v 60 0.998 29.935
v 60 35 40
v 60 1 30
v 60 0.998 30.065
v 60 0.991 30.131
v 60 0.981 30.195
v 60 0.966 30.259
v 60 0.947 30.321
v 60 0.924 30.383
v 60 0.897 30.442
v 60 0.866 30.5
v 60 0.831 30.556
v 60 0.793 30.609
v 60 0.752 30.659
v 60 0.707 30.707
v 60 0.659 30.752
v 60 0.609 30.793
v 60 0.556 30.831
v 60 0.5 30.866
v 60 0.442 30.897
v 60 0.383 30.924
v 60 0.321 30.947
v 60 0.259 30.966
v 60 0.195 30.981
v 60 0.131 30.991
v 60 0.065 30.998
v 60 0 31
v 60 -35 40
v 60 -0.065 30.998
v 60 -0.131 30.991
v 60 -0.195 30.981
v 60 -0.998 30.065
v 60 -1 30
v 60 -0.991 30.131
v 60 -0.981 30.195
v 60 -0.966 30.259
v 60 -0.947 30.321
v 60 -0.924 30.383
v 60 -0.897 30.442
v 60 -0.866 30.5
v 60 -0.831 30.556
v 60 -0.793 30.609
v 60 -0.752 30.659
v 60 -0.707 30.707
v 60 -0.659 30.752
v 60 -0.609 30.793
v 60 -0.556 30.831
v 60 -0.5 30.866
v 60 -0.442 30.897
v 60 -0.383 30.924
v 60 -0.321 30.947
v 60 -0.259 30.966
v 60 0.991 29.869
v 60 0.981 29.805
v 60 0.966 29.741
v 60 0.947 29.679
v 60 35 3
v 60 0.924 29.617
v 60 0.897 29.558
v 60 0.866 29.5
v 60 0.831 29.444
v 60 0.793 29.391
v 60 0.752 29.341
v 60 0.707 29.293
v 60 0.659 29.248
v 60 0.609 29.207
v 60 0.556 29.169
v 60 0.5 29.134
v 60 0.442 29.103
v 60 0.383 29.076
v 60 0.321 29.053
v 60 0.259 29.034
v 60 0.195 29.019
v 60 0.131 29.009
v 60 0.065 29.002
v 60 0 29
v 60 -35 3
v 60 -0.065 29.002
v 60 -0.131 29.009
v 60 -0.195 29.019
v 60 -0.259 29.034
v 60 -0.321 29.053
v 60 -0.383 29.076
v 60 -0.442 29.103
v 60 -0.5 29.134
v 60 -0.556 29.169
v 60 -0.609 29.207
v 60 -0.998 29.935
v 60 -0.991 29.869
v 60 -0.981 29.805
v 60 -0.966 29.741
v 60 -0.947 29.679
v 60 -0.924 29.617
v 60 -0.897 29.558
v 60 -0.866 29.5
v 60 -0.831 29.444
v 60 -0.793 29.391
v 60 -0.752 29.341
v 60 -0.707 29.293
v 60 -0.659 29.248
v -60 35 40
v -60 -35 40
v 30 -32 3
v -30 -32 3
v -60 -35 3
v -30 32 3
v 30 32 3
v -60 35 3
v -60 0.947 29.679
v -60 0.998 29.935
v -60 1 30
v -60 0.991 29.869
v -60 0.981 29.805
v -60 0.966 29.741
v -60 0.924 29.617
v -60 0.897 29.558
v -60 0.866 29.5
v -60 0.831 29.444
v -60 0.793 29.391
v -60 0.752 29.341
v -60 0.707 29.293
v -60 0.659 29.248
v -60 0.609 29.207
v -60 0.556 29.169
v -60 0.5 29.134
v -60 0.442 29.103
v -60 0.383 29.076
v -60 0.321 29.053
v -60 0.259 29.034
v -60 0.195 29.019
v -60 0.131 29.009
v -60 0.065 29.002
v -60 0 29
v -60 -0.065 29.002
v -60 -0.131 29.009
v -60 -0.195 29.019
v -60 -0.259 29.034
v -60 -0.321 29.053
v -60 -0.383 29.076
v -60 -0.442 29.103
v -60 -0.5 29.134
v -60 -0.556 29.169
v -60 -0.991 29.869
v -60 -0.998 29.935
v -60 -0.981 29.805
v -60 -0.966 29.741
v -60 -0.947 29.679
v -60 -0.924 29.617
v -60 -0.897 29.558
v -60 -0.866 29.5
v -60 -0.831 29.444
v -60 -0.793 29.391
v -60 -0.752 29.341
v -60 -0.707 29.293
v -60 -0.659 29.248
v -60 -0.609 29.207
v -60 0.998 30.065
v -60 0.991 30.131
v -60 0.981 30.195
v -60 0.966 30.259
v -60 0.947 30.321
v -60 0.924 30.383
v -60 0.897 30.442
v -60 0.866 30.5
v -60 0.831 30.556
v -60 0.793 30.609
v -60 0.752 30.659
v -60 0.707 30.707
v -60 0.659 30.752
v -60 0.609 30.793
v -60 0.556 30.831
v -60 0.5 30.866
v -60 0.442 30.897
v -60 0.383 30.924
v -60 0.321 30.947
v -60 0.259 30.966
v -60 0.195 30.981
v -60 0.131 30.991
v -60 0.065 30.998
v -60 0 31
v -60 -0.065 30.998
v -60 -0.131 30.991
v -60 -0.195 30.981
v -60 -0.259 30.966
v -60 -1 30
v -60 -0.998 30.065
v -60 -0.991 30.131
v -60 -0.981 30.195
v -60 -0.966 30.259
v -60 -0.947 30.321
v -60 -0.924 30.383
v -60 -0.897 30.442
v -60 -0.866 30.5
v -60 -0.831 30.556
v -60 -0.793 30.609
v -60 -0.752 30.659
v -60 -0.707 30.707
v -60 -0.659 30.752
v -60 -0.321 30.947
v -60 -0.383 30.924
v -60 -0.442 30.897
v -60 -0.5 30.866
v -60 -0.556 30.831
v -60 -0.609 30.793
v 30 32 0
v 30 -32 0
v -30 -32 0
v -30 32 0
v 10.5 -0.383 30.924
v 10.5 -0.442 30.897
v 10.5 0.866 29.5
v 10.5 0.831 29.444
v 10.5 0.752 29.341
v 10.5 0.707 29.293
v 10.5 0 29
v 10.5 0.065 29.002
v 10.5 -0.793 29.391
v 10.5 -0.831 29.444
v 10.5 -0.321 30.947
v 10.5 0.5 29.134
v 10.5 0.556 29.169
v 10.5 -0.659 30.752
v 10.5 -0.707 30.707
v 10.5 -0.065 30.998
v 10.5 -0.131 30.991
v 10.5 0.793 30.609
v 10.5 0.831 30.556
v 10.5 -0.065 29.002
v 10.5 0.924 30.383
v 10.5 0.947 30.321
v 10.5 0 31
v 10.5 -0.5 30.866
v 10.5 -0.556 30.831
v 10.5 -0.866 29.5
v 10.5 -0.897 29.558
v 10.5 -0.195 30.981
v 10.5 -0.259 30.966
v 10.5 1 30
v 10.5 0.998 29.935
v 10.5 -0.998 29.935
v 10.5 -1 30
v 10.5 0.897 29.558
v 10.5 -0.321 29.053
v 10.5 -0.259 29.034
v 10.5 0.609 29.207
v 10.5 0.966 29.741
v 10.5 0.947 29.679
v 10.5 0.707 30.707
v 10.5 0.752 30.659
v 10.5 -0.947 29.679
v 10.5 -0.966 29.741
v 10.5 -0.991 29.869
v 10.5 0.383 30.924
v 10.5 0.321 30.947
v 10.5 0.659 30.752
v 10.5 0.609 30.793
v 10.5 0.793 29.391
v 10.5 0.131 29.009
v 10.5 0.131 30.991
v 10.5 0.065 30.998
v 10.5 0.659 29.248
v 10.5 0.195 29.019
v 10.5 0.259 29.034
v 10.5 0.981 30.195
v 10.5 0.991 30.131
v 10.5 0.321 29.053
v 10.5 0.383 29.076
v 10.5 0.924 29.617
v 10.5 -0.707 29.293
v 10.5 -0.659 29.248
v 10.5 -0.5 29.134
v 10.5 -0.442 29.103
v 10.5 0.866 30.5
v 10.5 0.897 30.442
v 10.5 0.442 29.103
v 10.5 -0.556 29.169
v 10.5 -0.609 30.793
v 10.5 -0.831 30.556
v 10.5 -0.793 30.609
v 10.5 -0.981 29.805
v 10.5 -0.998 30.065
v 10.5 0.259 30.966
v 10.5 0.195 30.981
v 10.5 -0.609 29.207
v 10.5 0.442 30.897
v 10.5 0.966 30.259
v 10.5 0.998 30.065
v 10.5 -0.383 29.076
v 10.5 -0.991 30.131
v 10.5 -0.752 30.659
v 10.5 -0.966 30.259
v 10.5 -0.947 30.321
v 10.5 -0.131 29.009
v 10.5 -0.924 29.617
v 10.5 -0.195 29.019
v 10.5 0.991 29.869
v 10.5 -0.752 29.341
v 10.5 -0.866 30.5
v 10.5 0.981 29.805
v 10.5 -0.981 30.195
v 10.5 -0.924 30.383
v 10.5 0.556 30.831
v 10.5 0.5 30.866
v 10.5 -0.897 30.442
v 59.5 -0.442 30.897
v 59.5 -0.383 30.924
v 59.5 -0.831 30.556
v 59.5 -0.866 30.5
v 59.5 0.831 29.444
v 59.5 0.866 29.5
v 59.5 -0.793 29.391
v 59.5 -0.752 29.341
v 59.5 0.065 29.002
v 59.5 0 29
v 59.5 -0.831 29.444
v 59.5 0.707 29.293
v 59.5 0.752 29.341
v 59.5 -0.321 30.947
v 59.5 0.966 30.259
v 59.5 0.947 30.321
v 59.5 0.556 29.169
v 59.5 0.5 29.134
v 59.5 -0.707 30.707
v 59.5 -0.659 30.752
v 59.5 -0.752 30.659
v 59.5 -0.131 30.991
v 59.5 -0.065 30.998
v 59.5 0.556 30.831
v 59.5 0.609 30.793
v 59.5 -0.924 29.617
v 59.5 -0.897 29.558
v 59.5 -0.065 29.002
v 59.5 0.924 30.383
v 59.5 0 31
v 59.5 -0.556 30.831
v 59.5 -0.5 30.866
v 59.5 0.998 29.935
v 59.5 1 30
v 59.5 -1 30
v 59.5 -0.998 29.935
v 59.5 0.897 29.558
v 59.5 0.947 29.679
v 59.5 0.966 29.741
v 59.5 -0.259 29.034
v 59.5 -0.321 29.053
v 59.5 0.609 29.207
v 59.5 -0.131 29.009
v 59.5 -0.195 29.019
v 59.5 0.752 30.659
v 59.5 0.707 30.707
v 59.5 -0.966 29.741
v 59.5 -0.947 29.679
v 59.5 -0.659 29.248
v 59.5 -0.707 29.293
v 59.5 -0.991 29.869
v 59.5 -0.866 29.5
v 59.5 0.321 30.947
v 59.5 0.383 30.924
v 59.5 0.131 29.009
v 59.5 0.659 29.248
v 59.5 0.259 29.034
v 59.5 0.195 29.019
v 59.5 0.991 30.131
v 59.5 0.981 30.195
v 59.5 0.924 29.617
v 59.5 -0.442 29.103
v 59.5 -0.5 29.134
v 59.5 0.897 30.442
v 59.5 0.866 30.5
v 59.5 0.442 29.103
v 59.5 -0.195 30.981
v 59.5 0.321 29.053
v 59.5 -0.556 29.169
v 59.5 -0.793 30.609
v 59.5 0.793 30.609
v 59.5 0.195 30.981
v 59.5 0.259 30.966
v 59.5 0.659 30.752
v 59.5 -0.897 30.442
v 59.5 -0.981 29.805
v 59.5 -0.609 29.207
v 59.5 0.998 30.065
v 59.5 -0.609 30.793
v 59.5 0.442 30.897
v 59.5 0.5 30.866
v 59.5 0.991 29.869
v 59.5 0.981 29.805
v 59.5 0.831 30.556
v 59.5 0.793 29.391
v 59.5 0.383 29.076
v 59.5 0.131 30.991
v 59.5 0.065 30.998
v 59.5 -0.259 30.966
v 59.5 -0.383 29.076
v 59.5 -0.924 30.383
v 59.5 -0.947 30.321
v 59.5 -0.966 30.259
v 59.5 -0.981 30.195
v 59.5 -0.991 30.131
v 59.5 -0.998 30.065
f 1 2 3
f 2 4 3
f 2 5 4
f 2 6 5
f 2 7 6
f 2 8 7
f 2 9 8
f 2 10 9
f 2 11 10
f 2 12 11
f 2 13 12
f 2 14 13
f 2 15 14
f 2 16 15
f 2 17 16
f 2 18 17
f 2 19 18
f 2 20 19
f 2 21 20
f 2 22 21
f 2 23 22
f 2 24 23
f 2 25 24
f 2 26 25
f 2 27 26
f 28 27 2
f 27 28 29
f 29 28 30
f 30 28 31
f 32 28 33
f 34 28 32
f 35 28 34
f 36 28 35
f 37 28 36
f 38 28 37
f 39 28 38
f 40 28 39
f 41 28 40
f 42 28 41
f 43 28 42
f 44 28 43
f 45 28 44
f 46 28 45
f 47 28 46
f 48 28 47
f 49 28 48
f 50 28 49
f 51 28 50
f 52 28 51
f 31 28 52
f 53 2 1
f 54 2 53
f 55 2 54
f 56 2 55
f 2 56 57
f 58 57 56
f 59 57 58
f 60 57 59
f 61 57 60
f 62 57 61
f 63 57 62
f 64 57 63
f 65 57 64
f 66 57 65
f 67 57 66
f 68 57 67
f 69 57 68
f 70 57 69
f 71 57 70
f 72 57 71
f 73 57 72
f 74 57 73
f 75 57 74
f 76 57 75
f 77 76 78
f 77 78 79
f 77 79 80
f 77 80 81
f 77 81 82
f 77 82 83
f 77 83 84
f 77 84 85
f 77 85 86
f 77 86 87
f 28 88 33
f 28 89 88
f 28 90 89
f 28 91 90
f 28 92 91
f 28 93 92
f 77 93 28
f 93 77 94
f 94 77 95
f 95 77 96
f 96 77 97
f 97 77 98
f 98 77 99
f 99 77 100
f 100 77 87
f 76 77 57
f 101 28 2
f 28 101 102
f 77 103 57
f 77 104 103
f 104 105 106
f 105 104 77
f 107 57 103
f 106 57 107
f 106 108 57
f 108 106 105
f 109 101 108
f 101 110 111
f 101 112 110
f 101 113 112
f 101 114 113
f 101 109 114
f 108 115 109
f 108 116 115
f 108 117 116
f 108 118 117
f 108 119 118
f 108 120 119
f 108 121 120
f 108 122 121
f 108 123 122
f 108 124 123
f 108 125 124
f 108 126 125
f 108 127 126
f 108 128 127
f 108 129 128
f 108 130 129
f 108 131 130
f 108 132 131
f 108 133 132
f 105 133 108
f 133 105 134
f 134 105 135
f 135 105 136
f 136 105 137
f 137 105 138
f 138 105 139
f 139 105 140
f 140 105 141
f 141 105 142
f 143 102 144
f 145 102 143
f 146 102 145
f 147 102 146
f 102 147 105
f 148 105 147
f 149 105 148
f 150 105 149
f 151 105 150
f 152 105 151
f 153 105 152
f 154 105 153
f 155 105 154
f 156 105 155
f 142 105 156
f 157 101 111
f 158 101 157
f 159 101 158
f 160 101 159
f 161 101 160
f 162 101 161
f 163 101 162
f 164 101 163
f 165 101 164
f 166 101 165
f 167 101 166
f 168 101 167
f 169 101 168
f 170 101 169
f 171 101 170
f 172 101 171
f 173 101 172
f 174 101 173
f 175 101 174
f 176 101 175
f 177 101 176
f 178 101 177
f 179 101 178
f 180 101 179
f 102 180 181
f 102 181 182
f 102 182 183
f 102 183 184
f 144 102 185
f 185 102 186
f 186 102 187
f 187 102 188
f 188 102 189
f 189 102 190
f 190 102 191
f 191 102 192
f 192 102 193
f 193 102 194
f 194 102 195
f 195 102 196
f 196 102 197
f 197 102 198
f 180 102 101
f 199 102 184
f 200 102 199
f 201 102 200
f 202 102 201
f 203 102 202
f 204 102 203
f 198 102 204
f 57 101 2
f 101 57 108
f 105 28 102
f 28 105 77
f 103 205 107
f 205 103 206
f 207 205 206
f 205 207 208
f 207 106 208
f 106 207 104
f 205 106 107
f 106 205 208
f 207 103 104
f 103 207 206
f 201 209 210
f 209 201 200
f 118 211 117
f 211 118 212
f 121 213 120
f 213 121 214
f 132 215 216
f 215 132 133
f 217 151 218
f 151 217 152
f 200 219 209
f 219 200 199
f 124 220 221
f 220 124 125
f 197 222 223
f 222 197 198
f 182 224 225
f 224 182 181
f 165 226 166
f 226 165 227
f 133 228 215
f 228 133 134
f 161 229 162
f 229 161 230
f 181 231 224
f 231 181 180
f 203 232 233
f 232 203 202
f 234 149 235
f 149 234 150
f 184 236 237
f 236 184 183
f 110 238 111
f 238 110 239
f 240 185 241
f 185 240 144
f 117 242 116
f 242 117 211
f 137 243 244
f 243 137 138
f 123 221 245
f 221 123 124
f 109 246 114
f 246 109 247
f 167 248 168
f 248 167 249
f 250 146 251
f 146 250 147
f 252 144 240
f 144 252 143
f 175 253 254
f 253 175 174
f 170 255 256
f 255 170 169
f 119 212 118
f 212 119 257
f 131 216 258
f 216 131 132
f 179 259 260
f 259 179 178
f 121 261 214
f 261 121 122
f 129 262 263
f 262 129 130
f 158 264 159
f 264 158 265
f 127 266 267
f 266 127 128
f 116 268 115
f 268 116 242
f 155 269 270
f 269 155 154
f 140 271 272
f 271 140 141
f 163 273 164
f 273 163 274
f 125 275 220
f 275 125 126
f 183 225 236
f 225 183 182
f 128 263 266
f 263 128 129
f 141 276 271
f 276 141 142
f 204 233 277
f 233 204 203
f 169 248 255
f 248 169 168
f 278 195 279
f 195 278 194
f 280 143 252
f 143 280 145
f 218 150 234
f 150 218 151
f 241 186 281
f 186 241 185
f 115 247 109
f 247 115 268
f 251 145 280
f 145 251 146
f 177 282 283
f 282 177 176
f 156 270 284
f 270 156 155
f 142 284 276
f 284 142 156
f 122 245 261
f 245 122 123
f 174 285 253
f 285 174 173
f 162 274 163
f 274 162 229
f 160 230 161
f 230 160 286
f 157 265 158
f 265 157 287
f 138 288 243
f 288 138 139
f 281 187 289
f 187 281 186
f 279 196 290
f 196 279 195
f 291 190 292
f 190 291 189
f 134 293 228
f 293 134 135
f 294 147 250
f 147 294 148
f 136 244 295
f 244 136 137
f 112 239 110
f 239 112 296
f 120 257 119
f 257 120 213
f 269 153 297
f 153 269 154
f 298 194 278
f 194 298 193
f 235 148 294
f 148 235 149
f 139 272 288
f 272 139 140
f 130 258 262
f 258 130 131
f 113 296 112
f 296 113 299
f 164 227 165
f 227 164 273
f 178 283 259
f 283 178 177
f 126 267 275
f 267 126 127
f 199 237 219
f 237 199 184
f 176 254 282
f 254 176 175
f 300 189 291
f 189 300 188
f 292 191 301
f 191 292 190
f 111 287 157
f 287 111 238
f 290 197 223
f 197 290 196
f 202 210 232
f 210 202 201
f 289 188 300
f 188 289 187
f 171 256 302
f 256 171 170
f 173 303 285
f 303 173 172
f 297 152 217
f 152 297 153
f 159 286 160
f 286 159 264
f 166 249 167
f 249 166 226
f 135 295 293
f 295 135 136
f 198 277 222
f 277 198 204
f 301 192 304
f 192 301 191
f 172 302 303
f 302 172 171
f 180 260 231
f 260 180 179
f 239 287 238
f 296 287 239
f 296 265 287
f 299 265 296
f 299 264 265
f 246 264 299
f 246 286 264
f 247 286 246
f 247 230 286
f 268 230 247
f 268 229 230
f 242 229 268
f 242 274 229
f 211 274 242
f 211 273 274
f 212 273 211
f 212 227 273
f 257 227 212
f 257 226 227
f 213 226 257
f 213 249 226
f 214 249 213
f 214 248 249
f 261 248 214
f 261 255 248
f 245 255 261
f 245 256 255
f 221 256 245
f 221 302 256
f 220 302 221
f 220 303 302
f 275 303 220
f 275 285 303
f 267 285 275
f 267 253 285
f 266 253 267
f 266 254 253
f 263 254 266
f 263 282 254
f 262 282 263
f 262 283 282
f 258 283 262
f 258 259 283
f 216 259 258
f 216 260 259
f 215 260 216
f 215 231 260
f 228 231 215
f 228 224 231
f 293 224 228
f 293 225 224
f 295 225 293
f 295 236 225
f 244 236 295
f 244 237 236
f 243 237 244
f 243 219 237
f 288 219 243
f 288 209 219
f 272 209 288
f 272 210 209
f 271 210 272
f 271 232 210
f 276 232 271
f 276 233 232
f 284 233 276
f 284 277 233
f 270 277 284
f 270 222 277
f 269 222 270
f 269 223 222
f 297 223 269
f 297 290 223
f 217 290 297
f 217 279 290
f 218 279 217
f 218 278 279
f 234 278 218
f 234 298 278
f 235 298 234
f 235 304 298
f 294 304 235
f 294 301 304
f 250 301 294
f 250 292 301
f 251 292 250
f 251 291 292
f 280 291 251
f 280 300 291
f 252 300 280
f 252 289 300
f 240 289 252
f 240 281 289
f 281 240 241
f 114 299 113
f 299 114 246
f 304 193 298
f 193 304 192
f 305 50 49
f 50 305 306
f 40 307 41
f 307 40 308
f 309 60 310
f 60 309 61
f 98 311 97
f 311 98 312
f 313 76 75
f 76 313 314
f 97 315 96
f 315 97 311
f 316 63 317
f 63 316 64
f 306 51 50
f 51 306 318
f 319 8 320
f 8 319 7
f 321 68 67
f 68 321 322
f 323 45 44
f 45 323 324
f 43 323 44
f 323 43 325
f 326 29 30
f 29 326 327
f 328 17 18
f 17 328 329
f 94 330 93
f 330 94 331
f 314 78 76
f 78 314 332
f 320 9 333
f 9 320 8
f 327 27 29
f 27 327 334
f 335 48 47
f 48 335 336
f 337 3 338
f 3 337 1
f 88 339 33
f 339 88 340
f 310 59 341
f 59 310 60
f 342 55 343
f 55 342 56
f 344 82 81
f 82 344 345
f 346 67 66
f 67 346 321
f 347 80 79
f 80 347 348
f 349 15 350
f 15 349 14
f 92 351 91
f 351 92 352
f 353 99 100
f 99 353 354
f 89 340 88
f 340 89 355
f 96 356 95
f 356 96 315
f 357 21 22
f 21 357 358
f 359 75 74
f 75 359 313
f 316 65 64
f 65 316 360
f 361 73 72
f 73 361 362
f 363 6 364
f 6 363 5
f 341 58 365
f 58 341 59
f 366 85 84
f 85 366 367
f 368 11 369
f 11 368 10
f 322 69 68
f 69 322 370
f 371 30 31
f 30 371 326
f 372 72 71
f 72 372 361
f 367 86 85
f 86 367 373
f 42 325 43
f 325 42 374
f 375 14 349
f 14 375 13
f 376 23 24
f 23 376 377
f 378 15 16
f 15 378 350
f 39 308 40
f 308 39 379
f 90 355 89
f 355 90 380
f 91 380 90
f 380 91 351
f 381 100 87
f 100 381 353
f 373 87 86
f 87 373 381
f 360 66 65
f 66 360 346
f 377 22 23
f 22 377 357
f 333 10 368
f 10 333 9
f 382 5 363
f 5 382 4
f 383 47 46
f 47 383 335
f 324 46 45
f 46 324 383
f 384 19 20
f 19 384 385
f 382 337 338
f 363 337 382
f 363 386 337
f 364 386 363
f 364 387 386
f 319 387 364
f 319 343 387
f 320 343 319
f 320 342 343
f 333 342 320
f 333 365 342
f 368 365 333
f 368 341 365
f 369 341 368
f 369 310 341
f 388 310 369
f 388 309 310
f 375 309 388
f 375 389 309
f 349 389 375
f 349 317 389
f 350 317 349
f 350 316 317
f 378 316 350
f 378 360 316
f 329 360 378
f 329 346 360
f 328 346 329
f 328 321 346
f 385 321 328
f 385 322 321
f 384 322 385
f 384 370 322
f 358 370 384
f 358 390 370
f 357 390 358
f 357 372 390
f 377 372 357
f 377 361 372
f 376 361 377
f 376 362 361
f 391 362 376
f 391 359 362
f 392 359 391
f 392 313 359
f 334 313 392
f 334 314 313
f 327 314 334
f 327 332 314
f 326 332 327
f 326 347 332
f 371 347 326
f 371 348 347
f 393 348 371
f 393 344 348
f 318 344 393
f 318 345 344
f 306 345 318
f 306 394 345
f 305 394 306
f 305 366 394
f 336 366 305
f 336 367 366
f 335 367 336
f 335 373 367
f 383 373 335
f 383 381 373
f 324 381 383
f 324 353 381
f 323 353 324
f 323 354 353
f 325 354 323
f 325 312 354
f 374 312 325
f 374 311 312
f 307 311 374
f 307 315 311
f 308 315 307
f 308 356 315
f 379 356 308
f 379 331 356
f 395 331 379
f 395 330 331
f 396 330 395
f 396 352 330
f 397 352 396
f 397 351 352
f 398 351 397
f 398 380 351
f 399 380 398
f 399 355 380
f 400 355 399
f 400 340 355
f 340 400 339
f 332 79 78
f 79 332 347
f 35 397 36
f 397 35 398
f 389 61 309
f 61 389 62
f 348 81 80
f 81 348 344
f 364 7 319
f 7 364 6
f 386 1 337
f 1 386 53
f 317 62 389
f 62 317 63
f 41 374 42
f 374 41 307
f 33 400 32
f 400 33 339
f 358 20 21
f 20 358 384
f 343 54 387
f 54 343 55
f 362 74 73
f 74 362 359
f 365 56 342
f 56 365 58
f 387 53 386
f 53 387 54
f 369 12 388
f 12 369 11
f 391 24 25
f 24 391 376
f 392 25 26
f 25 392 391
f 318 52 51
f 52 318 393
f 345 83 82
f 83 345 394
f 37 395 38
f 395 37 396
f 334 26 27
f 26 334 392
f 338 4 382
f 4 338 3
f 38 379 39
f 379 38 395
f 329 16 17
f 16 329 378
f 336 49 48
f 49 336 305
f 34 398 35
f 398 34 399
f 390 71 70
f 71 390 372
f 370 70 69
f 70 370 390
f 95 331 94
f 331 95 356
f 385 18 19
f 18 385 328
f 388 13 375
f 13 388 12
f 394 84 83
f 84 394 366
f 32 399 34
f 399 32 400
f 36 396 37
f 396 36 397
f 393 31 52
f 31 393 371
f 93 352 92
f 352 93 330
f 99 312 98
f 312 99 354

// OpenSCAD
// Mini horizontal gel-electrophoresis buffer tank
// Print orientation: base on XY plane, open top facing +Z

// ---------- Parameters ----------
outer_x   = 120;   // outer length in X (mm)
outer_y   = 70;    // outer width in Y (mm)
height    = 40;    // overall height in Z (mm)
wall      = 3;     // wall thickness (mm)
floor     = 3;     // floor thickness (mm)

platform_x = 60;   // platform length in X (mm), centred
platform_top_z = 13; // top of platform above inner floor (mm)

hole_d     = 2;    // electrode hole diameter (mm)
hole_y     = 0;    // hole Y position (mm)
hole_z     = 30;   // hole Z position (mm)

eps        = 0.5;  // cutter overshoot past faces (mm)

$fn = 96;

// ---------- Derived ----------
inner_x = outer_x - 2*wall;   // 114
inner_y = outer_y - 2*wall;   // 64
floor_t = floor;              // 3
plat_h  = platform_top_z - floor_t; // 10

// ---------- Model ----------
difference() {
    union() {
        // Tank body
        translate([-outer_x/2, -outer_y/2, floor])
            cube([outer_x, outer_y, height - floor]);

        // Central raised platform (throughs the floor, ends at z = 13)
        translate([-platform_x/2, -inner_y/2, 0])
            cube([platform_x, inner_y, platform_top_z]);
    }

    // Electrode holes through end walls along X
    for (sx = [-1, 1])
        translate([sx > 0 ? outer_x/2 - eps : -outer_x/2 - eps,
                   hole_y, hole_z])
            rotate([0, 90, 0])
                cylinder(d = hole_d, h = outer_y + 2*eps);
}
